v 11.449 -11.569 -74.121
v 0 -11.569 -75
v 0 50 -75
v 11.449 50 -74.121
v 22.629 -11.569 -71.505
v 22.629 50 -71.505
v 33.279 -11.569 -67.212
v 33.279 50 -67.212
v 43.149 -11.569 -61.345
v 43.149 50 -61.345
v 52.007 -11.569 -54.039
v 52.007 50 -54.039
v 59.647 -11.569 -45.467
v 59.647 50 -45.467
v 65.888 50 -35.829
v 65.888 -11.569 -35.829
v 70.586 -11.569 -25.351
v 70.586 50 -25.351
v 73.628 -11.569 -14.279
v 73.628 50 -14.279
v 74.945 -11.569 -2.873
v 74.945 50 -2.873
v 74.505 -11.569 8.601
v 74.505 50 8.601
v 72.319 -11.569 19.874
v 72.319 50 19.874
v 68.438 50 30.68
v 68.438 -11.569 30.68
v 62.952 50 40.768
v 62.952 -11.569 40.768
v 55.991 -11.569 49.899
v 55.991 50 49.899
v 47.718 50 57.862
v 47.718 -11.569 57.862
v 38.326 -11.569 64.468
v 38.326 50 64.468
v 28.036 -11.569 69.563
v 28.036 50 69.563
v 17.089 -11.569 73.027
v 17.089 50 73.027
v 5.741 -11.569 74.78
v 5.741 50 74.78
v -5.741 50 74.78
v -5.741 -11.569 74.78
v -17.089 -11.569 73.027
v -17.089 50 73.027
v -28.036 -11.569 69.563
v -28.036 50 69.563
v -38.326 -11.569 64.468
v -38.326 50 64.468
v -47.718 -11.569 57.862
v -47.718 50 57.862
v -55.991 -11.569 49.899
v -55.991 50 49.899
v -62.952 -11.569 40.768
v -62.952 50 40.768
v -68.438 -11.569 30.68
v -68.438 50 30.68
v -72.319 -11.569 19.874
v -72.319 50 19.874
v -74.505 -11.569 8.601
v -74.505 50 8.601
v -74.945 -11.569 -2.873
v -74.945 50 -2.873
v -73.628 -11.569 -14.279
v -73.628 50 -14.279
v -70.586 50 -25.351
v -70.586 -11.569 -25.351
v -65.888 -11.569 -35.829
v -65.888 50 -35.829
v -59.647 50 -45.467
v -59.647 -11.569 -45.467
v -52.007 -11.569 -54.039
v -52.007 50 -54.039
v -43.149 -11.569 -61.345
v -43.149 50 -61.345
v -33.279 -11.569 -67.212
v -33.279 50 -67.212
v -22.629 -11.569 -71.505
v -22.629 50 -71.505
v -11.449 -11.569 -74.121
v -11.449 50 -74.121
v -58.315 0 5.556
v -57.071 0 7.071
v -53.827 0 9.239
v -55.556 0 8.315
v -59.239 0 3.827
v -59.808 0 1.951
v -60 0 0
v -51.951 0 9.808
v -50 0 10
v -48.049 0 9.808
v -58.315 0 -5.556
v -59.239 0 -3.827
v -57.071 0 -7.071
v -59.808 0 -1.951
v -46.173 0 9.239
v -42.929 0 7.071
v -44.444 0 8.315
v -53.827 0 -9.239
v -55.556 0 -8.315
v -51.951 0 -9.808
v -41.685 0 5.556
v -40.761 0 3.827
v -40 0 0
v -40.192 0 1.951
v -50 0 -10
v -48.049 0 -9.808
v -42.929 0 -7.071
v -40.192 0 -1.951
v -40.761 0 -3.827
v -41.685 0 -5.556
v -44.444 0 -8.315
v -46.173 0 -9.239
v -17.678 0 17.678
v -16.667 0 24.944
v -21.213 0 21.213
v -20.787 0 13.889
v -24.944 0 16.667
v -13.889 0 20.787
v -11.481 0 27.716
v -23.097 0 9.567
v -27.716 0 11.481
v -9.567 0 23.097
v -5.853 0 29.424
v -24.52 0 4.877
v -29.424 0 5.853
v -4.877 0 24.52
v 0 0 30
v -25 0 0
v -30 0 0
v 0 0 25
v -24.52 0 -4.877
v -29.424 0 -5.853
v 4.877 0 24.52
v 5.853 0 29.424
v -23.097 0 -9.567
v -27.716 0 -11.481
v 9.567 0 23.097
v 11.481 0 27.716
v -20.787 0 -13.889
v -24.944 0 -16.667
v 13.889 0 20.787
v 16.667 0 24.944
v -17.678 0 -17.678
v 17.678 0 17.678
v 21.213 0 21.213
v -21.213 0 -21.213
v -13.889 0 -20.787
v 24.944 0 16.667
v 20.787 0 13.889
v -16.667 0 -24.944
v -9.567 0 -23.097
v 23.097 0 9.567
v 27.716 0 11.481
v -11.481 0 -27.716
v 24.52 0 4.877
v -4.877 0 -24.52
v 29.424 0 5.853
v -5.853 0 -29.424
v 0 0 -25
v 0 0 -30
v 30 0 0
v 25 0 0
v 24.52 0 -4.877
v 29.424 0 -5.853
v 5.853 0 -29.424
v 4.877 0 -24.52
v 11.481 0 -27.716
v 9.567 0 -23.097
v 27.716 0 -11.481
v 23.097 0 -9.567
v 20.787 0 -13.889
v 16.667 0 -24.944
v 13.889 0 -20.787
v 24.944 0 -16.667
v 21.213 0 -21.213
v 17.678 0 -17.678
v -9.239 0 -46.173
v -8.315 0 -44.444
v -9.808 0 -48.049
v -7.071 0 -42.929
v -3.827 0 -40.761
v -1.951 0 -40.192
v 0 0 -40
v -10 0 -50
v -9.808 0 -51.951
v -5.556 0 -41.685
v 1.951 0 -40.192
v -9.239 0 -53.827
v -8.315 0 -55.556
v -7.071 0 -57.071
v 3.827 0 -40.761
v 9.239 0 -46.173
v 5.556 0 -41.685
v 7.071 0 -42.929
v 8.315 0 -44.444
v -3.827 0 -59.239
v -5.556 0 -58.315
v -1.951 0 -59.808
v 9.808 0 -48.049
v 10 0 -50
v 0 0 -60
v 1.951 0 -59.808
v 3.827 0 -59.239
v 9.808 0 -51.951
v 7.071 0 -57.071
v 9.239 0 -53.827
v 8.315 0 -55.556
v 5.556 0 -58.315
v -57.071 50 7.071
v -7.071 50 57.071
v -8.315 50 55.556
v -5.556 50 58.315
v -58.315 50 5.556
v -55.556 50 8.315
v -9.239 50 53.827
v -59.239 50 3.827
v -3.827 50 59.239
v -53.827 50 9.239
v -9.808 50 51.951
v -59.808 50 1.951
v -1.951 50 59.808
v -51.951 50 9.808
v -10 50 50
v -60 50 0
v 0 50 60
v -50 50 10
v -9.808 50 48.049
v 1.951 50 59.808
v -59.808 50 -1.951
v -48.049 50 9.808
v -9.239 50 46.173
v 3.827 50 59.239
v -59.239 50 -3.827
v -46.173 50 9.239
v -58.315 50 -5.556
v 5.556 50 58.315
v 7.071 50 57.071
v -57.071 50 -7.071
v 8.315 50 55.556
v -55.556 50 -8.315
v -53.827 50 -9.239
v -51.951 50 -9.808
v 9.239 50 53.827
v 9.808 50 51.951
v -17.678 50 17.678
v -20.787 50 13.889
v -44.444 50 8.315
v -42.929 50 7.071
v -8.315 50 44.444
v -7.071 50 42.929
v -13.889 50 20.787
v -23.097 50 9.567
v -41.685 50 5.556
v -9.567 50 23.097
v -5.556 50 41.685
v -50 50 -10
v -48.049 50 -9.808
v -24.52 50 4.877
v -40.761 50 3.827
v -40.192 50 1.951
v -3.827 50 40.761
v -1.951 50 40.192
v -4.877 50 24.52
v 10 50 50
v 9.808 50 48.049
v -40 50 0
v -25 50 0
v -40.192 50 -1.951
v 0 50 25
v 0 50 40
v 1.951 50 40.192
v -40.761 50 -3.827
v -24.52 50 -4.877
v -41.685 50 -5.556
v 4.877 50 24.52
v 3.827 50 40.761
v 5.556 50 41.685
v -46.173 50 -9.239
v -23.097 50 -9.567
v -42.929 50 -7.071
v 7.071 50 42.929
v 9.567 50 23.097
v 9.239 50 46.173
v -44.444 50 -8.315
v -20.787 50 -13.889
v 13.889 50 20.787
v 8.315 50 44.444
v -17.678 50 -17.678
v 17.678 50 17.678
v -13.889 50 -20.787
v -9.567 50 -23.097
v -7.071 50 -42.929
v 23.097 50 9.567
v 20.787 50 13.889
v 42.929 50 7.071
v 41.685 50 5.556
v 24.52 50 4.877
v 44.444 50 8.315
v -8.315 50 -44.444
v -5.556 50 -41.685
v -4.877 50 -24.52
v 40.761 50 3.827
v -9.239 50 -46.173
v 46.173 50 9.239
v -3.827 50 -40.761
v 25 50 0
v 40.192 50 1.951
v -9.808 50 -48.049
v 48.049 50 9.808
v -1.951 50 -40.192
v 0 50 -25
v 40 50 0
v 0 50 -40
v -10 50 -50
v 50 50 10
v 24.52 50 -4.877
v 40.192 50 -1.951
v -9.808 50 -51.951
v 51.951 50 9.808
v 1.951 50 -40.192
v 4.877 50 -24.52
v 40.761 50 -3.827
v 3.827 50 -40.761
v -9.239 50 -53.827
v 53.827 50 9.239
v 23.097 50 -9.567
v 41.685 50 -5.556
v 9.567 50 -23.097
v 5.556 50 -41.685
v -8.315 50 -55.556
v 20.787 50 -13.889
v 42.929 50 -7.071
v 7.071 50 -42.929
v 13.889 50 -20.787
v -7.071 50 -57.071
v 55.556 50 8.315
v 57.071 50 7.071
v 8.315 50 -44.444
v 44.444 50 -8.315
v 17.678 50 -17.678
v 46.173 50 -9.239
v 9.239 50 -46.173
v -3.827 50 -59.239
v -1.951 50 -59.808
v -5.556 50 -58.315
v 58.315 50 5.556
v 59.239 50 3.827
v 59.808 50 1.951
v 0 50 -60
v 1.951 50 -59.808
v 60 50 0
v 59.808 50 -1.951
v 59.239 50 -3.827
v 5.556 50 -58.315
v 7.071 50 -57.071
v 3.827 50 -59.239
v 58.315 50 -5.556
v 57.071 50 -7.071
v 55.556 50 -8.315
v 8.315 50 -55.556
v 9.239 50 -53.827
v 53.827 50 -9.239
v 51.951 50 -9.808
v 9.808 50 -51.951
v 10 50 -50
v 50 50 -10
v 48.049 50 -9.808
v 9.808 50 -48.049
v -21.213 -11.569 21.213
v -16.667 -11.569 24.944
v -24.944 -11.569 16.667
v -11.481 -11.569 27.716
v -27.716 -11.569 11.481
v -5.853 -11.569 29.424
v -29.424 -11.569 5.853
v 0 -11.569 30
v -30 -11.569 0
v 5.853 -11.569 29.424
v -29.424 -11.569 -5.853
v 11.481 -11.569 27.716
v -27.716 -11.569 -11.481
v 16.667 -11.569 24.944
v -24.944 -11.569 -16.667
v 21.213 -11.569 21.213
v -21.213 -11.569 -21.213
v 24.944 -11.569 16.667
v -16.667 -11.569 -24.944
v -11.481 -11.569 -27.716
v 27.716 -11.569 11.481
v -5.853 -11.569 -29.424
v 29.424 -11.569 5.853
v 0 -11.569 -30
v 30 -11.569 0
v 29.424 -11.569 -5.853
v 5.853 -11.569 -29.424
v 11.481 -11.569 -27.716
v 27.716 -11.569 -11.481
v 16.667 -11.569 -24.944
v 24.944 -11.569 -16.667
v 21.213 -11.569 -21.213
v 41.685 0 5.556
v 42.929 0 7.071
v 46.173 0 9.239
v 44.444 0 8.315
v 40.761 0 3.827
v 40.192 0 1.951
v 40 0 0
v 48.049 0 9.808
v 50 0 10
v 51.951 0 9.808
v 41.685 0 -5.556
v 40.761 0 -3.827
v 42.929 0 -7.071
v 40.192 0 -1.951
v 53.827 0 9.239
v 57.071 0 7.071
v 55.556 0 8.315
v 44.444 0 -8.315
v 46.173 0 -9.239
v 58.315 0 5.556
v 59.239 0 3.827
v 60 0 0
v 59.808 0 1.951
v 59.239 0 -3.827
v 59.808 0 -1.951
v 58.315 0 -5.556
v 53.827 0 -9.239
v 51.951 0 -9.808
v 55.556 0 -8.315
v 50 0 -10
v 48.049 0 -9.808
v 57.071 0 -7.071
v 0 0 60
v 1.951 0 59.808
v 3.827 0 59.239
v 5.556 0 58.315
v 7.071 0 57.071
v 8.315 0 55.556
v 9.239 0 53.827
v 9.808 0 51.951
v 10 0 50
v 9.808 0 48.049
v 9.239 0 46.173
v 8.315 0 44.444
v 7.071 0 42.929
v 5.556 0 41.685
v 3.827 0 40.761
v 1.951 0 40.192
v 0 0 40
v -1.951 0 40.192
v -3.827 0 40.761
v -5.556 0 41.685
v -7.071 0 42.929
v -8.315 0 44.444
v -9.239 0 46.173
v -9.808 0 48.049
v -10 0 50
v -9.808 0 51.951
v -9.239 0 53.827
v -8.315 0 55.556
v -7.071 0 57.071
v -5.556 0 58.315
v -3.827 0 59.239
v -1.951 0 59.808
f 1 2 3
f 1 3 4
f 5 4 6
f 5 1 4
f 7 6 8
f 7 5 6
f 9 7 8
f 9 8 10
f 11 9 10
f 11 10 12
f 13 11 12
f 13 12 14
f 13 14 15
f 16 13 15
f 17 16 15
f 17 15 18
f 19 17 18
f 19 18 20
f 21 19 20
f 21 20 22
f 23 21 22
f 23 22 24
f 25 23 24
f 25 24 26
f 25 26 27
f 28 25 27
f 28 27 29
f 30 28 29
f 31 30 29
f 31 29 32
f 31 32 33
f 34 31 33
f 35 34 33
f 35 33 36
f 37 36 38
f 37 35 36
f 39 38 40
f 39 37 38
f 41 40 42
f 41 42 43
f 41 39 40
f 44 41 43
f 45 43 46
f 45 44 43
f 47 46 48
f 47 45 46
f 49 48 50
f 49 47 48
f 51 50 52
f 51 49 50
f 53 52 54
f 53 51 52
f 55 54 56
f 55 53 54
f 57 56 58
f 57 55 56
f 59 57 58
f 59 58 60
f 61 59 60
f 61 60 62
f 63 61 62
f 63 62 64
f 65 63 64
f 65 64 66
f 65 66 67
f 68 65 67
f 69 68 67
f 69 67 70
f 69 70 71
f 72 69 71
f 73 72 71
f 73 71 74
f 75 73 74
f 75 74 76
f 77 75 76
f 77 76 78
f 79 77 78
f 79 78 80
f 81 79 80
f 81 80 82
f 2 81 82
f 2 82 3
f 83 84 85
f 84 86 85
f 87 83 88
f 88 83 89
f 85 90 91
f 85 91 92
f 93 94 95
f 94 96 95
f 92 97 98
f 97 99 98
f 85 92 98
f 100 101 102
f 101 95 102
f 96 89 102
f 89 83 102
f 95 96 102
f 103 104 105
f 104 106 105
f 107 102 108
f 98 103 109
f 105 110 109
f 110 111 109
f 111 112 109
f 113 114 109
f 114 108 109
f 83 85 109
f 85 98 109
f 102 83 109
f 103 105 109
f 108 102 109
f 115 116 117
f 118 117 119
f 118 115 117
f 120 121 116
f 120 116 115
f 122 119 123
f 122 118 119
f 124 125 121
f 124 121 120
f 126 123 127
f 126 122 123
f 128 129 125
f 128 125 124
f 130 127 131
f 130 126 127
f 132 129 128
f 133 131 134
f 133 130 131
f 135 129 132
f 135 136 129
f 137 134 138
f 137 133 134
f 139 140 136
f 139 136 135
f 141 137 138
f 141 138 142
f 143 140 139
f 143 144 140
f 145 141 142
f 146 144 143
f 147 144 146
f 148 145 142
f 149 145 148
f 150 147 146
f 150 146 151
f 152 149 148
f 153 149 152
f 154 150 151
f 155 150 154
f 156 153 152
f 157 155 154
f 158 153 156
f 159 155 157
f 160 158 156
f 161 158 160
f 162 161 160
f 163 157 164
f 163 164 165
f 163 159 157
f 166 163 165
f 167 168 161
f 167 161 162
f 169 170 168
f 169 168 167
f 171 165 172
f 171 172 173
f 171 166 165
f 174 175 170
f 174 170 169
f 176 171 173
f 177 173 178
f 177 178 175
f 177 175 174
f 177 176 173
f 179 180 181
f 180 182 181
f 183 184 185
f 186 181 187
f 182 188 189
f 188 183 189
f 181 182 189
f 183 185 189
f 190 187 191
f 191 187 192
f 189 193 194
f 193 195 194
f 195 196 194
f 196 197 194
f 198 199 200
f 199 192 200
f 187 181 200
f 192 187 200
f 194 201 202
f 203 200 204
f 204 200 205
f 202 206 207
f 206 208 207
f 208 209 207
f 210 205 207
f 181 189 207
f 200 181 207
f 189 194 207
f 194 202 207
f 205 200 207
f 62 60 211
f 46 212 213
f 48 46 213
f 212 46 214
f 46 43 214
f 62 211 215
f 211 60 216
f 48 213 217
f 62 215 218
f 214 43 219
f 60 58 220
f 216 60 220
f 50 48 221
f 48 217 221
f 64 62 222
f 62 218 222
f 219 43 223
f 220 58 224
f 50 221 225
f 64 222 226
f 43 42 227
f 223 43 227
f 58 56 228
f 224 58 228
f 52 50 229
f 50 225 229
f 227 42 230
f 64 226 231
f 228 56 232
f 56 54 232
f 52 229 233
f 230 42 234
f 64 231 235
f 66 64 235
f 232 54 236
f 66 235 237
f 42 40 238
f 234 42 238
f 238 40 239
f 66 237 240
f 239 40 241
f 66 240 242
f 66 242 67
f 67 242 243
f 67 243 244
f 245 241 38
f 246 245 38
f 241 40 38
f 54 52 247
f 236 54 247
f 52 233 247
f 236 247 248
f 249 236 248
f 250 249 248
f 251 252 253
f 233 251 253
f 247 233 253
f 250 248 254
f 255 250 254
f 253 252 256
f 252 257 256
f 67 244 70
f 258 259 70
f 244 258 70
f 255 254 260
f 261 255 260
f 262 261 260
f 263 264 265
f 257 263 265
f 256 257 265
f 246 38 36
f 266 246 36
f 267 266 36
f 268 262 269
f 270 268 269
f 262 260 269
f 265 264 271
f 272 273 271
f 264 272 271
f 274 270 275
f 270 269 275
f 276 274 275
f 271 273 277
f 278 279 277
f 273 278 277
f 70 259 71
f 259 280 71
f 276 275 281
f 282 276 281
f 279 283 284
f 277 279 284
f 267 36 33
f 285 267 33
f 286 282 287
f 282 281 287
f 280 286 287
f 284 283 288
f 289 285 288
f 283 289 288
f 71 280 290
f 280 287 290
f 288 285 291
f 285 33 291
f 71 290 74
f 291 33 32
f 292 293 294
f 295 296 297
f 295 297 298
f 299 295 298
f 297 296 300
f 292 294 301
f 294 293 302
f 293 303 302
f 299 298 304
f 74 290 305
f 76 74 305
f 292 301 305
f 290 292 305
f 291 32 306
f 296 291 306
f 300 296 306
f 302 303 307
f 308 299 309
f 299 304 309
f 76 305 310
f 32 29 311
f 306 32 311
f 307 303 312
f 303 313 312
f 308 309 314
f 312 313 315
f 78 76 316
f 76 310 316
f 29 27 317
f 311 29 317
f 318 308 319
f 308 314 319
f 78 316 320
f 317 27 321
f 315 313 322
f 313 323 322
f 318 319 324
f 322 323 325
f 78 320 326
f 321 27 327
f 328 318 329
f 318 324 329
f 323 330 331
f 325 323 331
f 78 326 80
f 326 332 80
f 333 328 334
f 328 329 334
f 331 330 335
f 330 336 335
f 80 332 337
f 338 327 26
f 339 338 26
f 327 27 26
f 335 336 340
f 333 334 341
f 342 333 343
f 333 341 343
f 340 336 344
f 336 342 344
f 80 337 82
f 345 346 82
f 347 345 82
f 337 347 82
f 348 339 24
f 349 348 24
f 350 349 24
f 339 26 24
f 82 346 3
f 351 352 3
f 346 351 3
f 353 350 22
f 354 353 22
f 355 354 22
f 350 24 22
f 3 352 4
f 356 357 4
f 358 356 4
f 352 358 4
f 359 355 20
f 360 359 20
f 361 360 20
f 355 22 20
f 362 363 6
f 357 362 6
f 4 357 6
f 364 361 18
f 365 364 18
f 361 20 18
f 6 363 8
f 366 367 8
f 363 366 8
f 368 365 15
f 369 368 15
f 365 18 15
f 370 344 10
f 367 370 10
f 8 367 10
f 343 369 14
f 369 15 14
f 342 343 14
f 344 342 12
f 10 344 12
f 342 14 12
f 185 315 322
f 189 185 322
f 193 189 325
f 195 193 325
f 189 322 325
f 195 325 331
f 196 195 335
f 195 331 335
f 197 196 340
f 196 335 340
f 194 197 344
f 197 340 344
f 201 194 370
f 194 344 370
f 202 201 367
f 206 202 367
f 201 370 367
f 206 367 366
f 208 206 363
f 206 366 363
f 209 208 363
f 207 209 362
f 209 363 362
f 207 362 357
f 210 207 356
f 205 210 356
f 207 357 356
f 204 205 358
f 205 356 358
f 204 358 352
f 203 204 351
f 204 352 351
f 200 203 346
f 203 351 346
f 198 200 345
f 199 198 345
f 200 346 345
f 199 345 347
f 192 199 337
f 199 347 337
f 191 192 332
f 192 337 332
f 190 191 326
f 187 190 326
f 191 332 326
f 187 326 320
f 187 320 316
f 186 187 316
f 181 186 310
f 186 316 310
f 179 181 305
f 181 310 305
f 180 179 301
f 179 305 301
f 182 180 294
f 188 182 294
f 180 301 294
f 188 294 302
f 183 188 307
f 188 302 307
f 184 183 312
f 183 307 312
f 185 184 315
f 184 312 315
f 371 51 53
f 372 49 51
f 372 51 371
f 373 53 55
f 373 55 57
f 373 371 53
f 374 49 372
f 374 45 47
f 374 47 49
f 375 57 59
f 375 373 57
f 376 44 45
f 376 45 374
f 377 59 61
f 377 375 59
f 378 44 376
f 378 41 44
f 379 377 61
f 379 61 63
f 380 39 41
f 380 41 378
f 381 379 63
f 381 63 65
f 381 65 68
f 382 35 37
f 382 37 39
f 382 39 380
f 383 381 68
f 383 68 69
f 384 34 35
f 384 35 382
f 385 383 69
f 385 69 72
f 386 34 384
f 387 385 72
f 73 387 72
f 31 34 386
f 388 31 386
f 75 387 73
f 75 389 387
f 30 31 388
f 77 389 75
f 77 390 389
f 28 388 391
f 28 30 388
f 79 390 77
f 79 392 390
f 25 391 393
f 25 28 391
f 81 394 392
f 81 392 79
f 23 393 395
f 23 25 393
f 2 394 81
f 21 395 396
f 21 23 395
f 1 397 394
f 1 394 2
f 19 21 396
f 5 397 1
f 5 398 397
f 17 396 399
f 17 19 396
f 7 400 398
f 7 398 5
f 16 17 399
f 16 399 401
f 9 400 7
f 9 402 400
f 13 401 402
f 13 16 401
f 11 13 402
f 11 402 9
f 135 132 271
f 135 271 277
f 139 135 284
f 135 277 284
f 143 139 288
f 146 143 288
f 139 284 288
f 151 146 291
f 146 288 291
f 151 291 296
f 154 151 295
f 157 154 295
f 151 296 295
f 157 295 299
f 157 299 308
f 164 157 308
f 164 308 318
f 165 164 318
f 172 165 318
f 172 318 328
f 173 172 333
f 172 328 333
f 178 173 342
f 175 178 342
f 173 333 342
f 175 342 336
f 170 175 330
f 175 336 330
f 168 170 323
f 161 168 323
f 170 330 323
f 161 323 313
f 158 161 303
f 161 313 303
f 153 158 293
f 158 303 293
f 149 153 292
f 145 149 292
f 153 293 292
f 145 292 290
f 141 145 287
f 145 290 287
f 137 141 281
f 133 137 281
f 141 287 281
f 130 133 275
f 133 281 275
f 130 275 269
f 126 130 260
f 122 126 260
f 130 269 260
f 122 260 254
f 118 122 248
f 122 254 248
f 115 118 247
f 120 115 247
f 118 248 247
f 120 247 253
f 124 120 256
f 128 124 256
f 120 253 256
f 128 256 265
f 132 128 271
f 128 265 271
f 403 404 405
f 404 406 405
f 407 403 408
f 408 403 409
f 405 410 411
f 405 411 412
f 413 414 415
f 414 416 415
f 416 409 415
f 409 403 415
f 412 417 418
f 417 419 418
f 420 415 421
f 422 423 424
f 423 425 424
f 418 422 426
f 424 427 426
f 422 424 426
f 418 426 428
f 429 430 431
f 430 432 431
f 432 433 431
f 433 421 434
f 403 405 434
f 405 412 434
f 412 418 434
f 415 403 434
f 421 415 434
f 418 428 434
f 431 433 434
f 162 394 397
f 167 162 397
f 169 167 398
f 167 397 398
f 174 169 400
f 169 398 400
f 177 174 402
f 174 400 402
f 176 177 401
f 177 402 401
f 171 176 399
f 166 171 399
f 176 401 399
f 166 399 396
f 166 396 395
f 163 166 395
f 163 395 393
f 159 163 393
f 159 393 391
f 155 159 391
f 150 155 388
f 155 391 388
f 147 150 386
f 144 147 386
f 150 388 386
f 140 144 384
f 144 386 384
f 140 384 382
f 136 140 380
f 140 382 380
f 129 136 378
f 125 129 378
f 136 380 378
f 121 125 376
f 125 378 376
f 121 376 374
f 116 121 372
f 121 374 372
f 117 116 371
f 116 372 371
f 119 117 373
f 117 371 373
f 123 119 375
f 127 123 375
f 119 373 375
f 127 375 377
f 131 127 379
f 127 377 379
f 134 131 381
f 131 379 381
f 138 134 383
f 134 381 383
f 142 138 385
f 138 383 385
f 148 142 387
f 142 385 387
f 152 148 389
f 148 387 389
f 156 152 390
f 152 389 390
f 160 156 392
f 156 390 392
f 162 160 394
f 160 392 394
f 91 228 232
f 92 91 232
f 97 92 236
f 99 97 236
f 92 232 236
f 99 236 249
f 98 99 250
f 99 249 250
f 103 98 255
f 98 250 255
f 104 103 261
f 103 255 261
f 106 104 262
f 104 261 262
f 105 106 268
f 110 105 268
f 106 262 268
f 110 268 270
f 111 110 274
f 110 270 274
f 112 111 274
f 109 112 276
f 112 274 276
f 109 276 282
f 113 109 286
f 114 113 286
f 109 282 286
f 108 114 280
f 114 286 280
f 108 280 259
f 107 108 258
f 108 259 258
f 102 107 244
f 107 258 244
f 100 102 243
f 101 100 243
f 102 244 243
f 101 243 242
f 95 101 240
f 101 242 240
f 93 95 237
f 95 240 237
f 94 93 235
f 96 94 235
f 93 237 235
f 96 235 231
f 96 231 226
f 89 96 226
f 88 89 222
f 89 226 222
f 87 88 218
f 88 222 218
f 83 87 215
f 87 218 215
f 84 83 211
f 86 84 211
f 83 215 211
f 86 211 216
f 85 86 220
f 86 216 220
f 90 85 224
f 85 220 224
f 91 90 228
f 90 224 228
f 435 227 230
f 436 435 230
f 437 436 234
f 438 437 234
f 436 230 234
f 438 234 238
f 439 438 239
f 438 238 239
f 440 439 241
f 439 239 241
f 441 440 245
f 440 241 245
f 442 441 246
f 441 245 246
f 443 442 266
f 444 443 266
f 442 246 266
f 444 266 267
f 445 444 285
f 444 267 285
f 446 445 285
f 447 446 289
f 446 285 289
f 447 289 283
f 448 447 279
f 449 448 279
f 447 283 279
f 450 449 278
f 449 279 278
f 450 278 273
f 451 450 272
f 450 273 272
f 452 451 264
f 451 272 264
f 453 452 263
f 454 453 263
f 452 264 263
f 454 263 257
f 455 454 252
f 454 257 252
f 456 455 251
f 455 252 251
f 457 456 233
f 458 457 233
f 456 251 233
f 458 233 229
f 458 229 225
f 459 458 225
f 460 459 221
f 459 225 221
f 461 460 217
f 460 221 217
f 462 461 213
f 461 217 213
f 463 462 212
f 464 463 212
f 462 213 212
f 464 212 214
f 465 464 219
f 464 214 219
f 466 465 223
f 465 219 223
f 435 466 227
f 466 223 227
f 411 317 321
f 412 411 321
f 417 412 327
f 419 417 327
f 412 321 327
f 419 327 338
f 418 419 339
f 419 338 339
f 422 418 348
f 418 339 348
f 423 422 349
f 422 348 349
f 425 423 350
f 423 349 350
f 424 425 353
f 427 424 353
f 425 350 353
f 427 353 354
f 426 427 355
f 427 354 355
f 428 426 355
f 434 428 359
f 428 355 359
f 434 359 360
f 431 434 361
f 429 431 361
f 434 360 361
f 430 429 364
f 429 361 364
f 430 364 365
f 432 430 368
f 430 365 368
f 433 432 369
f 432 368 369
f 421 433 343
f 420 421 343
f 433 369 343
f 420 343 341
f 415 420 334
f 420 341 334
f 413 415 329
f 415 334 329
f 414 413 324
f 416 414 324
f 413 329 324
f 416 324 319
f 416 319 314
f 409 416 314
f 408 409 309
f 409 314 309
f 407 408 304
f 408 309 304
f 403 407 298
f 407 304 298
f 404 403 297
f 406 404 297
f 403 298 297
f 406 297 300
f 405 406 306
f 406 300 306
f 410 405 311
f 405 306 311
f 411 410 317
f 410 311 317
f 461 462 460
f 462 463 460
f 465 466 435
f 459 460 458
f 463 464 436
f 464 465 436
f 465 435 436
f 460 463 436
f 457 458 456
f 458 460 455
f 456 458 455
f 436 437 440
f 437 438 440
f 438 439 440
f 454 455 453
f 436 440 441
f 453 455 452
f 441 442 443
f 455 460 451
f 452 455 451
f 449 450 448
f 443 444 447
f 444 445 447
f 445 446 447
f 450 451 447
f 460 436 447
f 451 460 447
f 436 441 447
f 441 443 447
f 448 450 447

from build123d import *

# Parameters (mm, degrees)
SKETCH1_R           = 30
BOSS_EXTRUDE1_DEPTH = 50
SKETCH2_R           = 75
BOSS_EXTRUDE2_DEPTH = 50
SKETCH3_R           = 25
SKETCH3_R_2         = 10
CUT_EXTRUDE1_DEPTH  = 50
BOSS_EXTRUDE4_START = 11.56865
SKETCH5_R           = 75
SKETCH5_R_2         = 30
BOSS_EXTRUDE4_DEPTH = 11.56865


with BuildPart() as part:
    # Sketch1 → Boss-Extrude1 (new body)
    with BuildSketch(Plane(origin=(0, 0, 0), x_dir=(1, 0, 0), z_dir=(0, 1, 0))):
        with Locations(Location((0, 0, 0), (0, 0, 270))):
            Circle(SKETCH1_R)
    extrude(amount=BOSS_EXTRUDE1_DEPTH)

    # Sketch2 → Boss-Extrude2 (add)
    with BuildSketch(Plane(origin=(0, 0, 0), x_dir=(-1, 0, 0), z_dir=(0, -1, 0))):
        with Locations(Location((0, 0, 0), (0, 0, 90))):
            Circle(SKETCH2_R)
    extrude(amount=-BOSS_EXTRUDE2_DEPTH)

    # Sketch3 → Cut-Extrude1 (cut)
    with BuildSketch(Plane(origin=(0, 50, 0), x_dir=(1, 0, 0), z_dir=(0, 1, 0))):
        with Locations(Location((0, 0, 0), (0, 0, 270))):
            Circle(SKETCH3_R)
        with Locations(Location((0, -50, 0), (0, 0, 270))):
            Circle(SKETCH3_R_2)
        with Locations(Location((50, 0, 0), (0, 0, 270))):
            Circle(SKETCH3_R_2)
        with Locations(Location((0, 50, 0), (0, 0, 270))):
            Circle(SKETCH3_R_2)
        with Locations(Location((-50, 0, 0), (0, 0, 270))):
            Circle(SKETCH3_R_2)
    extrude(amount=-CUT_EXTRUDE1_DEPTH, mode=Mode.SUBTRACT)

    # Sketch5 → Boss-Extrude4 (add)
    with BuildSketch(Plane(origin=(0, 0, 0), x_dir=(-1, 0, 0), z_dir=(0, -1, 0)).offset(BOSS_EXTRUDE4_START)):
        with Locations(Location((0, 0, 0), (0, 0, 90))):
            Circle(SKETCH5_R)
        with Locations(Location((0, 0, 0), (0, 0, 90))):
            Circle(SKETCH5_R_2, mode=Mode.SUBTRACT)
    extrude(amount=-BOSS_EXTRUDE4_DEPTH)


solid = part.part
